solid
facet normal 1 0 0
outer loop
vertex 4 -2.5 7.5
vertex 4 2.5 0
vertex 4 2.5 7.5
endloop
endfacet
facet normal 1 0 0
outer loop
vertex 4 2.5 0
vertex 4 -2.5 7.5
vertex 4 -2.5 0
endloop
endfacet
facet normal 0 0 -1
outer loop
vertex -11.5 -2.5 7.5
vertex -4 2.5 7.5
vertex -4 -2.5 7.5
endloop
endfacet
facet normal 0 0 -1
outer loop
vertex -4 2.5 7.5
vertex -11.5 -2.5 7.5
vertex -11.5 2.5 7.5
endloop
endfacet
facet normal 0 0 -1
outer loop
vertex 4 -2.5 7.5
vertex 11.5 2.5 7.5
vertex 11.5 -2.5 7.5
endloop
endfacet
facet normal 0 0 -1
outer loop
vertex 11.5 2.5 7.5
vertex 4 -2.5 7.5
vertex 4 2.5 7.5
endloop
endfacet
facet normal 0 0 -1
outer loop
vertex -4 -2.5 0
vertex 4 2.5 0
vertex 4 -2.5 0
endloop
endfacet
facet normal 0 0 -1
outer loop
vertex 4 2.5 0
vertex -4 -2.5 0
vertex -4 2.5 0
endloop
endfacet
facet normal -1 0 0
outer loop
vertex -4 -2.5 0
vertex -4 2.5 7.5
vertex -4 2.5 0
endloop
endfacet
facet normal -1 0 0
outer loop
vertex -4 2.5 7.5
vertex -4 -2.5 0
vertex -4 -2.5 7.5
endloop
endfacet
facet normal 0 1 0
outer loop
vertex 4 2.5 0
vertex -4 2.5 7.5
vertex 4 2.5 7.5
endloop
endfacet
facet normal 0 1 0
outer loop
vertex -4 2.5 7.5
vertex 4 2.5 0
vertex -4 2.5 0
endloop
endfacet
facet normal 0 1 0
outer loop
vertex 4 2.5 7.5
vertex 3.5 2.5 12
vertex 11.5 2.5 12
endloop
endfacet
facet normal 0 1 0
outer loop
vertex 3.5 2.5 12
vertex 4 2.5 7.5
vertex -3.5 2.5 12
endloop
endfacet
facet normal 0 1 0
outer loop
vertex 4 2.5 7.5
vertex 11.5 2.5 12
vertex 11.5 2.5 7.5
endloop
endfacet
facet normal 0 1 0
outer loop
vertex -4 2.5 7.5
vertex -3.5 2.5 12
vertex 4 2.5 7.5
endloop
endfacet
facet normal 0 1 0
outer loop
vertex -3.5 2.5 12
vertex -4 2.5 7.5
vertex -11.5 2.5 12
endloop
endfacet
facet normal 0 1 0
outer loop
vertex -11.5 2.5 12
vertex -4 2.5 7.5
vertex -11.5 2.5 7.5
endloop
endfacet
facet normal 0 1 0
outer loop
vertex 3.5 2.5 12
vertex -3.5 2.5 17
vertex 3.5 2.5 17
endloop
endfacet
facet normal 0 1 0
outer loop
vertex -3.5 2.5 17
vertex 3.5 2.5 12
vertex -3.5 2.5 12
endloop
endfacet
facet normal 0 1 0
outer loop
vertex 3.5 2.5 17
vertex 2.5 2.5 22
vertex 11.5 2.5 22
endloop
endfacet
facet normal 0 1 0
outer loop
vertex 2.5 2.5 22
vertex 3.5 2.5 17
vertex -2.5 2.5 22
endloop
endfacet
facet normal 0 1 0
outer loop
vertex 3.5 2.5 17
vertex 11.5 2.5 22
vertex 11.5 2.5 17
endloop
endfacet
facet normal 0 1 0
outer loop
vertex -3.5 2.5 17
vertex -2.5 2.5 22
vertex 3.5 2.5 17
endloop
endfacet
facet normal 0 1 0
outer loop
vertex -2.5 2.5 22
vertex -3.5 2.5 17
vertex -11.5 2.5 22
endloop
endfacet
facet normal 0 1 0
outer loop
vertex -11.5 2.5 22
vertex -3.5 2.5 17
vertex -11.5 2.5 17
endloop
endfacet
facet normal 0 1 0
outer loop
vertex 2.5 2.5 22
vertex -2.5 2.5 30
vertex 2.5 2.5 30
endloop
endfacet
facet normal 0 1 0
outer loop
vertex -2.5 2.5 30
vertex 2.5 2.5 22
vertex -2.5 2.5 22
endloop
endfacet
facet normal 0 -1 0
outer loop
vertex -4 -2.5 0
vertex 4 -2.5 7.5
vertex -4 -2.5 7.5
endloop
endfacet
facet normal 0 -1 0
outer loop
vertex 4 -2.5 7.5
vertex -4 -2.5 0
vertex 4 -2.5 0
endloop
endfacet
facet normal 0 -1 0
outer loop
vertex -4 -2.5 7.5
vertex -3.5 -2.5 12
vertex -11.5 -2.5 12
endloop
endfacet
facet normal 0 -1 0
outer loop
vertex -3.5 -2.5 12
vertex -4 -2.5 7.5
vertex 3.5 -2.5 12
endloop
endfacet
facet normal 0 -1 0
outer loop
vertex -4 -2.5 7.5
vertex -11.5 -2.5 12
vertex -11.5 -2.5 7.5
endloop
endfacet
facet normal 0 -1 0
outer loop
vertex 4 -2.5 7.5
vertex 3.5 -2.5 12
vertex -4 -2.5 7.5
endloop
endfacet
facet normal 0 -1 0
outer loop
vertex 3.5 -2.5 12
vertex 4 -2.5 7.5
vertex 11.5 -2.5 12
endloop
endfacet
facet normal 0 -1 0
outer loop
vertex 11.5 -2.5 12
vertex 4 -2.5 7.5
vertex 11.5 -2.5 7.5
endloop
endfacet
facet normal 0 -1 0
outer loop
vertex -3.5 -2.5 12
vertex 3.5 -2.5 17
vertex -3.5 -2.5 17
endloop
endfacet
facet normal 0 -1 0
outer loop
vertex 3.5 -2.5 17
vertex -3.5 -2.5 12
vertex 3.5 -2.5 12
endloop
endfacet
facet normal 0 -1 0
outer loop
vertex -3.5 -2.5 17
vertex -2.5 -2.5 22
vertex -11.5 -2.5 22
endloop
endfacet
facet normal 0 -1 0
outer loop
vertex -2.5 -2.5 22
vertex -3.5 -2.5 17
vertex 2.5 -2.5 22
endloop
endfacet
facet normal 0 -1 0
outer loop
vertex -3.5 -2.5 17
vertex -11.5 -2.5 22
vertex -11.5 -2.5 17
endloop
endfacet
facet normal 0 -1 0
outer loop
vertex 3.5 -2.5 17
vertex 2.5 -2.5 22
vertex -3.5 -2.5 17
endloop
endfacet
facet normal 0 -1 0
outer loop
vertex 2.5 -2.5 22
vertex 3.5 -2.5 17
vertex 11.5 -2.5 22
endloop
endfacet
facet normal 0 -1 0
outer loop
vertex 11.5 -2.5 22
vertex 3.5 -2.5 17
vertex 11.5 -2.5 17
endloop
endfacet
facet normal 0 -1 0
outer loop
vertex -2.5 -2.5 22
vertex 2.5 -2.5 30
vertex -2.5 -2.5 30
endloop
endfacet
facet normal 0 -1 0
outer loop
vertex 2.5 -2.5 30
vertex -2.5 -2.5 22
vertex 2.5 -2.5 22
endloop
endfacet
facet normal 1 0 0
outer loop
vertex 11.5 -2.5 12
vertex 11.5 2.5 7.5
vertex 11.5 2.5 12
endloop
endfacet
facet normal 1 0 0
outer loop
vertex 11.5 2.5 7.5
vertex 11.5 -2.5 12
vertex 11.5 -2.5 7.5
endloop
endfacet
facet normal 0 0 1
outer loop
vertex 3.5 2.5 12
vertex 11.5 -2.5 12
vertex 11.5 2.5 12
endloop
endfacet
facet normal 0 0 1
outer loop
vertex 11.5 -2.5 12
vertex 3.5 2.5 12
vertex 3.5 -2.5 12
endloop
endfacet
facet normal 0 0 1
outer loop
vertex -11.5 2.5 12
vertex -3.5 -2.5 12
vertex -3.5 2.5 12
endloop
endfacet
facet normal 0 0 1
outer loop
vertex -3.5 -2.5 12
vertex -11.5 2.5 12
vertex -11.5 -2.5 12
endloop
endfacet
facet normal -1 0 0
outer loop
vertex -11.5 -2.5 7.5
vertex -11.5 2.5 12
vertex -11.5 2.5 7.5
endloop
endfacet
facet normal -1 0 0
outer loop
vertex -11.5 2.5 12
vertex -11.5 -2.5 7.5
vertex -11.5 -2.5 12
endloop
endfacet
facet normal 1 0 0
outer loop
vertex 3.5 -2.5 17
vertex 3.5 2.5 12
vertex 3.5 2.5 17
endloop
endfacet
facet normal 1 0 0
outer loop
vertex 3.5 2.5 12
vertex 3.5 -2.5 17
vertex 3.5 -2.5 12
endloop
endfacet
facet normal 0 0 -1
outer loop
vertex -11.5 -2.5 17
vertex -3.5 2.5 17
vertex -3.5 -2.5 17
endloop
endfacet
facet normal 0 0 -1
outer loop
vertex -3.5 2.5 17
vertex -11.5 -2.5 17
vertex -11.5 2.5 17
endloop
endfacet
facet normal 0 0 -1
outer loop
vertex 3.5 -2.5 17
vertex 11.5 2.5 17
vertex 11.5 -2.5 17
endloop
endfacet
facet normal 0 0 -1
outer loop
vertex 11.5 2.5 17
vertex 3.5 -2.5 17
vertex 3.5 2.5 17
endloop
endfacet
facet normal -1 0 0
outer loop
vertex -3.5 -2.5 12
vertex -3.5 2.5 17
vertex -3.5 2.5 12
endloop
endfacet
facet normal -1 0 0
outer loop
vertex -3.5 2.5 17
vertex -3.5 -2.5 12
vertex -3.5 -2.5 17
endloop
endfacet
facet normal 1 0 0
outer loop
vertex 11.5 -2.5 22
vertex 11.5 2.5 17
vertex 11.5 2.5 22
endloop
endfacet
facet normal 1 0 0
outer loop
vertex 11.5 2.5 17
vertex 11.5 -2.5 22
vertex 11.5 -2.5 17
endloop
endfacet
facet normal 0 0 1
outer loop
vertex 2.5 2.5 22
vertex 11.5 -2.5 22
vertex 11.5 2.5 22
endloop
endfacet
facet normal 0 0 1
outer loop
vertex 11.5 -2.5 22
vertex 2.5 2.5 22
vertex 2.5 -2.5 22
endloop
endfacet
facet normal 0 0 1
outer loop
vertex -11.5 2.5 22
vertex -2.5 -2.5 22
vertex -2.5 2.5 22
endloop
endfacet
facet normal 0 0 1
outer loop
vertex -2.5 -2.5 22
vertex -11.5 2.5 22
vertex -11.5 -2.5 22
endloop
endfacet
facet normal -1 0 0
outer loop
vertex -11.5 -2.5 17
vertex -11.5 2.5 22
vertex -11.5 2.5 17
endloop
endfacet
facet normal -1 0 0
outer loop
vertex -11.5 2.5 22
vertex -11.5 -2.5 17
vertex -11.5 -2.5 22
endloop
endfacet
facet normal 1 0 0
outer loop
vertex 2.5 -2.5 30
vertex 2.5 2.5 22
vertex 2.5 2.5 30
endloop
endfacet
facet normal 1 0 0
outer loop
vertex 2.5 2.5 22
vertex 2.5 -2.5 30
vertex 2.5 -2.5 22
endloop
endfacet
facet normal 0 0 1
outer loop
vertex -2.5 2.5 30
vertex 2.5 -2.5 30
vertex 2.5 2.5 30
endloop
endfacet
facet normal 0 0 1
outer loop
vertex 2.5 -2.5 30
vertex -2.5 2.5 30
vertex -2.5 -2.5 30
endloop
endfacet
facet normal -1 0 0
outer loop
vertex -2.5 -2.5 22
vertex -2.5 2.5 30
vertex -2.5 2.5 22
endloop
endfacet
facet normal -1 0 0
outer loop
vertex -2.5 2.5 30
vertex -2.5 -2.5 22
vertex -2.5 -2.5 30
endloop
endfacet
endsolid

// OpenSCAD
translate([0,0,7.5/2]) cube([8,5,7.5],center=true);
translate([0,0,7.5+4.5/2]) cube([8+2*7.5,5,4.5],center=true);
translate([0,0,7.5+4.5+5/2]) cube([7,5,5],center=true);
translate([0,0,7.5+4.5+5+5/2]) cube([5+2*9,5,5],center=true);
translate([0,0,7.5+4.5+5+5+8/2]) cube([5,5,8],center=true);
